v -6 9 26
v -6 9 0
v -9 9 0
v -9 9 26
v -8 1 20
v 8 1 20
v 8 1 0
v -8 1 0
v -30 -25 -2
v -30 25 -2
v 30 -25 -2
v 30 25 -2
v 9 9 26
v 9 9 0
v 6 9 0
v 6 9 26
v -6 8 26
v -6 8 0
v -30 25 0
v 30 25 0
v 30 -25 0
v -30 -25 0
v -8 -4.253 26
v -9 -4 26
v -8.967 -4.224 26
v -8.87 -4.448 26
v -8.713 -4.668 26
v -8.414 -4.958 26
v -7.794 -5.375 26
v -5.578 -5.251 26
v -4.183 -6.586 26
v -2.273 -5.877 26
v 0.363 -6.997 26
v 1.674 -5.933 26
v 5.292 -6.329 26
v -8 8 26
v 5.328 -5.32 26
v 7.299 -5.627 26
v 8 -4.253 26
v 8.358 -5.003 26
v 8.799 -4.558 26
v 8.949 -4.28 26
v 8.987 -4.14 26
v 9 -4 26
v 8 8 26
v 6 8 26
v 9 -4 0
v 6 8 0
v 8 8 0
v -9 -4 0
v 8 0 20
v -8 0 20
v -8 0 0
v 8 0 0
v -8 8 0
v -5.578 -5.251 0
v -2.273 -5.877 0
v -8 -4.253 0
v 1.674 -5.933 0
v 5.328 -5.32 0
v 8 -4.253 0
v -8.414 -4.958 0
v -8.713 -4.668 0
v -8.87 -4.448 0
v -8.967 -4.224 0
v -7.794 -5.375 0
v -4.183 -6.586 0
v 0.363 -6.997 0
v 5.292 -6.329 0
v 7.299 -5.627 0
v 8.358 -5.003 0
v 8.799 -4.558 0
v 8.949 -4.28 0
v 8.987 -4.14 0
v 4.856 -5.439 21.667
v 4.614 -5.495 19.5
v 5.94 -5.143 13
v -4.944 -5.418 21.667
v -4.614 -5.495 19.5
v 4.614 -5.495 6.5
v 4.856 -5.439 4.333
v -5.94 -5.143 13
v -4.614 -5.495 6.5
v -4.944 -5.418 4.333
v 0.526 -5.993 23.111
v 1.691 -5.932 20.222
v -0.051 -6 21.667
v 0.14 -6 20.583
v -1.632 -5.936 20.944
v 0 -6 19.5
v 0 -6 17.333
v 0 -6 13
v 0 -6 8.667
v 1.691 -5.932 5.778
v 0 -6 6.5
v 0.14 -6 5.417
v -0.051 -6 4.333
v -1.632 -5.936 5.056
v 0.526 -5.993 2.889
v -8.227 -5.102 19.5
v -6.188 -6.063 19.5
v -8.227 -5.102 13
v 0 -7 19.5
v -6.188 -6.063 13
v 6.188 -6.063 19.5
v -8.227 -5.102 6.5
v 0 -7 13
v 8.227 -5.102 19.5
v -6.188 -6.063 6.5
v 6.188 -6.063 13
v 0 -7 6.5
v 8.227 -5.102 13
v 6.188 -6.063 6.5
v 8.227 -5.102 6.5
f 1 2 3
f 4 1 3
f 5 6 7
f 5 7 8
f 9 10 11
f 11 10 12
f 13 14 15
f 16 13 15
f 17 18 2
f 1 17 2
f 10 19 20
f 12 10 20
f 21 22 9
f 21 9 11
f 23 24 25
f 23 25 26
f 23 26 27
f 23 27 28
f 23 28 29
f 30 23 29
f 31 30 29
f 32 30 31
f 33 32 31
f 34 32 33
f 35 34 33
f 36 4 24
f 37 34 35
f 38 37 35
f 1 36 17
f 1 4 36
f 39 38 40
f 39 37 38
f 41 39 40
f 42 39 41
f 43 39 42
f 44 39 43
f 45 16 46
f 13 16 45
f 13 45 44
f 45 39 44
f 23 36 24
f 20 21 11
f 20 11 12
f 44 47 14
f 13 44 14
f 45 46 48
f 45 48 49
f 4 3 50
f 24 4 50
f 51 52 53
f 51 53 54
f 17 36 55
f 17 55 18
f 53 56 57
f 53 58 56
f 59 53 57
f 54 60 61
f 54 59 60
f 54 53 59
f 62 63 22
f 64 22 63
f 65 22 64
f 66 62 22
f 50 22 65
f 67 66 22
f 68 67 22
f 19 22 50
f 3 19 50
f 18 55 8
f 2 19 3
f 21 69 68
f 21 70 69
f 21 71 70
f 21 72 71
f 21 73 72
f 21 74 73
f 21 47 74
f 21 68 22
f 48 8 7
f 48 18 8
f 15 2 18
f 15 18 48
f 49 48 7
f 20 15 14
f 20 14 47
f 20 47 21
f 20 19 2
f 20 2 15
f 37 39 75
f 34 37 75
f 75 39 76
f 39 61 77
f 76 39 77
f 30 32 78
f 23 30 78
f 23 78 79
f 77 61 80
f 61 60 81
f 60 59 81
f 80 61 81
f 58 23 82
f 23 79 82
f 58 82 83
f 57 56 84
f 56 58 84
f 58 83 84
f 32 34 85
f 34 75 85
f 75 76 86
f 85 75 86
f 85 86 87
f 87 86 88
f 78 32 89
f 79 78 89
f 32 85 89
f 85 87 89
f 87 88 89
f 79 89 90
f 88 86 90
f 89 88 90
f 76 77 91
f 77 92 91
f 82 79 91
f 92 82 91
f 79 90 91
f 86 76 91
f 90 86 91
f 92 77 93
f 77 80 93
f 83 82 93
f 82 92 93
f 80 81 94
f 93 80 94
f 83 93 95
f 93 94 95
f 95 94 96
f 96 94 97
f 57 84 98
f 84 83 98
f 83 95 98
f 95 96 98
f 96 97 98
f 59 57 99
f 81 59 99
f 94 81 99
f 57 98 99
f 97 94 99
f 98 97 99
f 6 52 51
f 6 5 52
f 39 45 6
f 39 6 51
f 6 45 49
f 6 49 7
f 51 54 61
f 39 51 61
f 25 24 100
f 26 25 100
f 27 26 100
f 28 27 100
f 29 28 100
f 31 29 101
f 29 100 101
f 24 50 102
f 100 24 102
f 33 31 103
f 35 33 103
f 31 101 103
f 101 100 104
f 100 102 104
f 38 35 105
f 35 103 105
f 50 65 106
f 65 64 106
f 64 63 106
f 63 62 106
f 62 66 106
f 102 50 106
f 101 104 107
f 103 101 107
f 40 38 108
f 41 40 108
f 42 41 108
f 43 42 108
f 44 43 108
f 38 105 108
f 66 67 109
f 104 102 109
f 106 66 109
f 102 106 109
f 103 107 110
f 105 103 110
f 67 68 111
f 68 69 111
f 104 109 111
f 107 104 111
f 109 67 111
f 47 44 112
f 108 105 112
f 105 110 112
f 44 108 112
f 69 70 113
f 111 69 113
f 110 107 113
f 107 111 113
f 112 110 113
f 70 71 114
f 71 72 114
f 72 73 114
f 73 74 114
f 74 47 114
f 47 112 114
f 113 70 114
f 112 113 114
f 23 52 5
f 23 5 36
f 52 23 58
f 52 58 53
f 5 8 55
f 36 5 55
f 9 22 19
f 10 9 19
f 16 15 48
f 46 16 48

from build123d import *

# Parameters (mm, degrees)
F1_DEPTH = 26
F2_W     = 60
F2_H     = 50
F3_DEPTH = 2
F4_DEPTH = 20


with BuildPart() as f1:
    # F0 (on Top) → F1 (new body)
    with BuildSketch(Plane.XY):
        with BuildLine():
            Line((-9, 9), (-9, 0))
            Line((-9, 0), (-9, -3))
            add(Edge.make_bspline(
                [(-9, -3), (-9, -2.5707676204), (-8.6315191286, -2.1415352408), (-8, -1.7474503993)],
                knots=[0, 0, 0, 0, 0.0715387299, 0.0715387299, 0.0715387299, 0.0715387299], degree=3))
            Line((-8, -1.7474503993), (-8, 0))
            Line((-8, 0), (-8, 1))
            Line((-8, 1), (-8, 8))
            Line((-8, 8), (-6, 8))
            Line((-6, 8), (-6, 9))
            Line((-6, 9), (-9, 9))
        make_face()
        with BuildLine():
            add(Edge.make_bspline(
                [(-9, -3), (-9, -2.5707676204), (-8.6315191286, -2.1415352408), (-8, -1.7474503993)],
                knots=[0, 0, 0, 0, 0.0715387299, 0.0715387299, 0.0715387299, 0.0715387299], degree=3))
            add(Edge.make_bspline(
                [(-8.8381918042, -3.5), (-8.9439804927, -3.3347222947), (-9, -3.1673611473), (-9, -3)],
                knots=[0.9721064754, 0.9721064754, 0.9721064754, 0.9721064754, 1, 1, 1, 1], degree=3))
            add(Edge.make_bspline(
                [(-8, -2.7474503993), (-8.3852847555, -2.9878784004), (-8.6726634562, -3.2413887449), (-8.8381918042, -3.5)],
                knots=[0.9284612701, 0.9284612701, 0.9284612701, 0.9284612701, 0.9721064754, 0.9721064754, 0.9721064754, 0.9721064754], degree=3))
            Line((-8, -2.7474503993), (-8, -1.7474503993))
        make_face()
        with BuildLine():
            add(Edge.make_bspline(
                [(-8.8381918042, -3.5), (-8.9439804927, -3.3347222947), (-9, -3.1673611473), (-9, -3)],
                knots=[0.9721064754, 0.9721064754, 0.9721064754, 0.9721064754, 1, 1, 1, 1], degree=3))
            Line((-9, -3), (-9, -4))
            add(Edge.make_bspline(
                [(-8.8381918042, -3.5), (-8.9439804927, -3.6652777053), (-9, -3.8326388527), (-9, -4)],
                knots=[0.9721064754, 0.9721064754, 0.9721064754, 0.9721064754, 1, 1, 1, 1], degree=3))
        make_face()
        with BuildLine():
            add(Edge.make_bspline(
                [(-8, -2.7474503993), (-8.3852847555, -2.9878784004), (-8.6726634562, -3.2413887449), (-8.8381918042, -3.5)],
                knots=[0.9284612701, 0.9284612701, 0.9284612701, 0.9284612701, 0.9721064754, 0.9721064754, 0.9721064754, 0.9721064754], degree=3))
            add(Edge.make_bspline(
                [(-8, -4.2525496007), (-8.3852847555, -4.0121215996), (-8.6726634562, -3.7586112551), (-8.8381918042, -3.5)],
                knots=[0.9284612701, 0.9284612701, 0.9284612701, 0.9284612701, 0.9721064754, 0.9721064754, 0.9721064754, 0.9721064754], degree=3))
            Line((-8, -4.2525496007), (-8, -2.7474503993))
        make_face()
        with BuildLine():
            add(Edge.make_bspline(
                [(-8.8381918042, -3.5), (-8.9439804927, -3.6652777053), (-9, -3.8326388527), (-9, -4)],
                knots=[0.9721064754, 0.9721064754, 0.9721064754, 0.9721064754, 1, 1, 1, 1], degree=3))
            add(Edge.make_bspline(
                [(-9, -4), (-9, -5.5), (0, -8.5), (9, -5.5), (9, -4)],
                knots=[0, 0, 0, 0, 0.25, 0.5, 0.5, 0.5, 0.5], degree=3))
            add(Edge.make_bspline(
                [(9, -4), (9, -3.8326388527), (8.9439804927, -3.6652777053), (8.8381918042, -3.5)],
                knots=[0.5, 0.5, 0.5, 0.5, 0.5278935246, 0.5278935246, 0.5278935246, 0.5278935246], degree=3))
            add(Edge.make_bspline(
                [(8.8381918042, -3.5), (8.6726634562, -3.7586112551), (8.3852847555, -4.0121215996), (8, -4.2525496007)],
                knots=[0.5278935246, 0.5278935246, 0.5278935246, 0.5278935246, 0.5715387299, 0.5715387299, 0.5715387299, 0.5715387299], degree=3))
            add(Edge.make_bspline(
                [(8, -4.2525496007), (6.4246057224, -5.2356378021), (0, -6.7643621979), (-6.4246057224, -5.2356378021), (-8, -4.2525496007)],
                knots=[0.5715387299, 0.5715387299, 0.5715387299, 0.5715387299, 0.75, 0.9284612701, 0.9284612701, 0.9284612701, 0.9284612701], degree=3))
            add(Edge.make_bspline(
                [(-8, -4.2525496007), (-8.3852847555, -4.0121215996), (-8.6726634562, -3.7586112551), (-8.8381918042, -3.5)],
                knots=[0.9284612701, 0.9284612701, 0.9284612701, 0.9284612701, 0.9721064754, 0.9721064754, 0.9721064754, 0.9721064754], degree=3))
        make_face()
        with BuildLine():
            add(Edge.make_bspline(
                [(8.8381918042, -3.5), (8.6726634562, -3.7586112551), (8.3852847555, -4.0121215996), (8, -4.2525496007)],
                knots=[0.5278935246, 0.5278935246, 0.5278935246, 0.5278935246, 0.5715387299, 0.5715387299, 0.5715387299, 0.5715387299], degree=3))
            add(Edge.make_bspline(
                [(8.8381918042, -3.5), (8.6726634562, -3.2413887449), (8.3852847555, -2.9878784004), (8, -2.7474503993)],
                knots=[0.5278935246, 0.5278935246, 0.5278935246, 0.5278935246, 0.5715387299, 0.5715387299, 0.5715387299, 0.5715387299], degree=3))
            Line((8, -2.7474503993), (8, -4.2525496007))
        make_face()
        with BuildLine():
            add(Edge.make_bspline(
                [(9, -3), (9, -3.1673611473), (8.9439804927, -3.3347222947), (8.8381918042, -3.5)],
                knots=[0.5, 0.5, 0.5, 0.5, 0.5278935246, 0.5278935246, 0.5278935246, 0.5278935246], degree=3))
            add(Edge.make_bspline(
                [(8, -1.7474503993), (8.6315191286, -2.1415352408), (9, -2.5707676204), (9, -3)],
                knots=[0.4284612701, 0.4284612701, 0.4284612701, 0.4284612701, 0.5, 0.5, 0.5, 0.5], degree=3))
            Line((8, -1.7474503993), (8, -2.7474503993))
            add(Edge.make_bspline(
                [(8.8381918042, -3.5), (8.6726634562, -3.2413887449), (8.3852847555, -2.9878784004), (8, -2.7474503993)],
                knots=[0.5278935246, 0.5278935246, 0.5278935246, 0.5278935246, 0.5715387299, 0.5715387299, 0.5715387299, 0.5715387299], degree=3))
        make_face()
        with BuildLine():
            add(Edge.make_bspline(
                [(8, -1.7474503993), (8.6315191286, -2.1415352408), (9, -2.5707676204), (9, -3)],
                knots=[0.4284612701, 0.4284612701, 0.4284612701, 0.4284612701, 0.5, 0.5, 0.5, 0.5], degree=3))
            Line((9, -3), (9, 0))
            Line((9, 0), (9, 9))
            Line((9, 9), (6, 9))
            Line((6, 9), (6, 8))
            Line((6, 8), (8, 8))
            Line((8, 8), (8, 1))
            Line((8, 1), (8, 0))
            Line((8, 0), (8, -1.7474503993))
        make_face()
        with BuildLine():
            add(Edge.make_bspline(
                [(9, -4), (9, -3.8326388527), (8.9439804927, -3.6652777053), (8.8381918042, -3.5)],
                knots=[0.5, 0.5, 0.5, 0.5, 0.5278935246, 0.5278935246, 0.5278935246, 0.5278935246], degree=3))
            Line((9, -4), (9, -3))
            add(Edge.make_bspline(
                [(9, -3), (9, -3.1673611473), (8.9439804927, -3.3347222947), (8.8381918042, -3.5)],
                knots=[0.5, 0.5, 0.5, 0.5, 0.5278935246, 0.5278935246, 0.5278935246, 0.5278935246], degree=3))
        make_face()
    extrude(amount=F1_DEPTH)

    # F2 (on Top) → F3 (join)
    with BuildSketch(Plane.XY):
        Rectangle(F2_W, F2_H)
    extrude(amount=-F3_DEPTH)

    # F0 (on Top) → F4 (join)
    with BuildSketch(Plane.XY):
        Polygon((-8, 0), (0, 0), (8, 0), (8, 1), (-8, 1), align=None)
    extrude(amount=F4_DEPTH)


solid = f1.part
